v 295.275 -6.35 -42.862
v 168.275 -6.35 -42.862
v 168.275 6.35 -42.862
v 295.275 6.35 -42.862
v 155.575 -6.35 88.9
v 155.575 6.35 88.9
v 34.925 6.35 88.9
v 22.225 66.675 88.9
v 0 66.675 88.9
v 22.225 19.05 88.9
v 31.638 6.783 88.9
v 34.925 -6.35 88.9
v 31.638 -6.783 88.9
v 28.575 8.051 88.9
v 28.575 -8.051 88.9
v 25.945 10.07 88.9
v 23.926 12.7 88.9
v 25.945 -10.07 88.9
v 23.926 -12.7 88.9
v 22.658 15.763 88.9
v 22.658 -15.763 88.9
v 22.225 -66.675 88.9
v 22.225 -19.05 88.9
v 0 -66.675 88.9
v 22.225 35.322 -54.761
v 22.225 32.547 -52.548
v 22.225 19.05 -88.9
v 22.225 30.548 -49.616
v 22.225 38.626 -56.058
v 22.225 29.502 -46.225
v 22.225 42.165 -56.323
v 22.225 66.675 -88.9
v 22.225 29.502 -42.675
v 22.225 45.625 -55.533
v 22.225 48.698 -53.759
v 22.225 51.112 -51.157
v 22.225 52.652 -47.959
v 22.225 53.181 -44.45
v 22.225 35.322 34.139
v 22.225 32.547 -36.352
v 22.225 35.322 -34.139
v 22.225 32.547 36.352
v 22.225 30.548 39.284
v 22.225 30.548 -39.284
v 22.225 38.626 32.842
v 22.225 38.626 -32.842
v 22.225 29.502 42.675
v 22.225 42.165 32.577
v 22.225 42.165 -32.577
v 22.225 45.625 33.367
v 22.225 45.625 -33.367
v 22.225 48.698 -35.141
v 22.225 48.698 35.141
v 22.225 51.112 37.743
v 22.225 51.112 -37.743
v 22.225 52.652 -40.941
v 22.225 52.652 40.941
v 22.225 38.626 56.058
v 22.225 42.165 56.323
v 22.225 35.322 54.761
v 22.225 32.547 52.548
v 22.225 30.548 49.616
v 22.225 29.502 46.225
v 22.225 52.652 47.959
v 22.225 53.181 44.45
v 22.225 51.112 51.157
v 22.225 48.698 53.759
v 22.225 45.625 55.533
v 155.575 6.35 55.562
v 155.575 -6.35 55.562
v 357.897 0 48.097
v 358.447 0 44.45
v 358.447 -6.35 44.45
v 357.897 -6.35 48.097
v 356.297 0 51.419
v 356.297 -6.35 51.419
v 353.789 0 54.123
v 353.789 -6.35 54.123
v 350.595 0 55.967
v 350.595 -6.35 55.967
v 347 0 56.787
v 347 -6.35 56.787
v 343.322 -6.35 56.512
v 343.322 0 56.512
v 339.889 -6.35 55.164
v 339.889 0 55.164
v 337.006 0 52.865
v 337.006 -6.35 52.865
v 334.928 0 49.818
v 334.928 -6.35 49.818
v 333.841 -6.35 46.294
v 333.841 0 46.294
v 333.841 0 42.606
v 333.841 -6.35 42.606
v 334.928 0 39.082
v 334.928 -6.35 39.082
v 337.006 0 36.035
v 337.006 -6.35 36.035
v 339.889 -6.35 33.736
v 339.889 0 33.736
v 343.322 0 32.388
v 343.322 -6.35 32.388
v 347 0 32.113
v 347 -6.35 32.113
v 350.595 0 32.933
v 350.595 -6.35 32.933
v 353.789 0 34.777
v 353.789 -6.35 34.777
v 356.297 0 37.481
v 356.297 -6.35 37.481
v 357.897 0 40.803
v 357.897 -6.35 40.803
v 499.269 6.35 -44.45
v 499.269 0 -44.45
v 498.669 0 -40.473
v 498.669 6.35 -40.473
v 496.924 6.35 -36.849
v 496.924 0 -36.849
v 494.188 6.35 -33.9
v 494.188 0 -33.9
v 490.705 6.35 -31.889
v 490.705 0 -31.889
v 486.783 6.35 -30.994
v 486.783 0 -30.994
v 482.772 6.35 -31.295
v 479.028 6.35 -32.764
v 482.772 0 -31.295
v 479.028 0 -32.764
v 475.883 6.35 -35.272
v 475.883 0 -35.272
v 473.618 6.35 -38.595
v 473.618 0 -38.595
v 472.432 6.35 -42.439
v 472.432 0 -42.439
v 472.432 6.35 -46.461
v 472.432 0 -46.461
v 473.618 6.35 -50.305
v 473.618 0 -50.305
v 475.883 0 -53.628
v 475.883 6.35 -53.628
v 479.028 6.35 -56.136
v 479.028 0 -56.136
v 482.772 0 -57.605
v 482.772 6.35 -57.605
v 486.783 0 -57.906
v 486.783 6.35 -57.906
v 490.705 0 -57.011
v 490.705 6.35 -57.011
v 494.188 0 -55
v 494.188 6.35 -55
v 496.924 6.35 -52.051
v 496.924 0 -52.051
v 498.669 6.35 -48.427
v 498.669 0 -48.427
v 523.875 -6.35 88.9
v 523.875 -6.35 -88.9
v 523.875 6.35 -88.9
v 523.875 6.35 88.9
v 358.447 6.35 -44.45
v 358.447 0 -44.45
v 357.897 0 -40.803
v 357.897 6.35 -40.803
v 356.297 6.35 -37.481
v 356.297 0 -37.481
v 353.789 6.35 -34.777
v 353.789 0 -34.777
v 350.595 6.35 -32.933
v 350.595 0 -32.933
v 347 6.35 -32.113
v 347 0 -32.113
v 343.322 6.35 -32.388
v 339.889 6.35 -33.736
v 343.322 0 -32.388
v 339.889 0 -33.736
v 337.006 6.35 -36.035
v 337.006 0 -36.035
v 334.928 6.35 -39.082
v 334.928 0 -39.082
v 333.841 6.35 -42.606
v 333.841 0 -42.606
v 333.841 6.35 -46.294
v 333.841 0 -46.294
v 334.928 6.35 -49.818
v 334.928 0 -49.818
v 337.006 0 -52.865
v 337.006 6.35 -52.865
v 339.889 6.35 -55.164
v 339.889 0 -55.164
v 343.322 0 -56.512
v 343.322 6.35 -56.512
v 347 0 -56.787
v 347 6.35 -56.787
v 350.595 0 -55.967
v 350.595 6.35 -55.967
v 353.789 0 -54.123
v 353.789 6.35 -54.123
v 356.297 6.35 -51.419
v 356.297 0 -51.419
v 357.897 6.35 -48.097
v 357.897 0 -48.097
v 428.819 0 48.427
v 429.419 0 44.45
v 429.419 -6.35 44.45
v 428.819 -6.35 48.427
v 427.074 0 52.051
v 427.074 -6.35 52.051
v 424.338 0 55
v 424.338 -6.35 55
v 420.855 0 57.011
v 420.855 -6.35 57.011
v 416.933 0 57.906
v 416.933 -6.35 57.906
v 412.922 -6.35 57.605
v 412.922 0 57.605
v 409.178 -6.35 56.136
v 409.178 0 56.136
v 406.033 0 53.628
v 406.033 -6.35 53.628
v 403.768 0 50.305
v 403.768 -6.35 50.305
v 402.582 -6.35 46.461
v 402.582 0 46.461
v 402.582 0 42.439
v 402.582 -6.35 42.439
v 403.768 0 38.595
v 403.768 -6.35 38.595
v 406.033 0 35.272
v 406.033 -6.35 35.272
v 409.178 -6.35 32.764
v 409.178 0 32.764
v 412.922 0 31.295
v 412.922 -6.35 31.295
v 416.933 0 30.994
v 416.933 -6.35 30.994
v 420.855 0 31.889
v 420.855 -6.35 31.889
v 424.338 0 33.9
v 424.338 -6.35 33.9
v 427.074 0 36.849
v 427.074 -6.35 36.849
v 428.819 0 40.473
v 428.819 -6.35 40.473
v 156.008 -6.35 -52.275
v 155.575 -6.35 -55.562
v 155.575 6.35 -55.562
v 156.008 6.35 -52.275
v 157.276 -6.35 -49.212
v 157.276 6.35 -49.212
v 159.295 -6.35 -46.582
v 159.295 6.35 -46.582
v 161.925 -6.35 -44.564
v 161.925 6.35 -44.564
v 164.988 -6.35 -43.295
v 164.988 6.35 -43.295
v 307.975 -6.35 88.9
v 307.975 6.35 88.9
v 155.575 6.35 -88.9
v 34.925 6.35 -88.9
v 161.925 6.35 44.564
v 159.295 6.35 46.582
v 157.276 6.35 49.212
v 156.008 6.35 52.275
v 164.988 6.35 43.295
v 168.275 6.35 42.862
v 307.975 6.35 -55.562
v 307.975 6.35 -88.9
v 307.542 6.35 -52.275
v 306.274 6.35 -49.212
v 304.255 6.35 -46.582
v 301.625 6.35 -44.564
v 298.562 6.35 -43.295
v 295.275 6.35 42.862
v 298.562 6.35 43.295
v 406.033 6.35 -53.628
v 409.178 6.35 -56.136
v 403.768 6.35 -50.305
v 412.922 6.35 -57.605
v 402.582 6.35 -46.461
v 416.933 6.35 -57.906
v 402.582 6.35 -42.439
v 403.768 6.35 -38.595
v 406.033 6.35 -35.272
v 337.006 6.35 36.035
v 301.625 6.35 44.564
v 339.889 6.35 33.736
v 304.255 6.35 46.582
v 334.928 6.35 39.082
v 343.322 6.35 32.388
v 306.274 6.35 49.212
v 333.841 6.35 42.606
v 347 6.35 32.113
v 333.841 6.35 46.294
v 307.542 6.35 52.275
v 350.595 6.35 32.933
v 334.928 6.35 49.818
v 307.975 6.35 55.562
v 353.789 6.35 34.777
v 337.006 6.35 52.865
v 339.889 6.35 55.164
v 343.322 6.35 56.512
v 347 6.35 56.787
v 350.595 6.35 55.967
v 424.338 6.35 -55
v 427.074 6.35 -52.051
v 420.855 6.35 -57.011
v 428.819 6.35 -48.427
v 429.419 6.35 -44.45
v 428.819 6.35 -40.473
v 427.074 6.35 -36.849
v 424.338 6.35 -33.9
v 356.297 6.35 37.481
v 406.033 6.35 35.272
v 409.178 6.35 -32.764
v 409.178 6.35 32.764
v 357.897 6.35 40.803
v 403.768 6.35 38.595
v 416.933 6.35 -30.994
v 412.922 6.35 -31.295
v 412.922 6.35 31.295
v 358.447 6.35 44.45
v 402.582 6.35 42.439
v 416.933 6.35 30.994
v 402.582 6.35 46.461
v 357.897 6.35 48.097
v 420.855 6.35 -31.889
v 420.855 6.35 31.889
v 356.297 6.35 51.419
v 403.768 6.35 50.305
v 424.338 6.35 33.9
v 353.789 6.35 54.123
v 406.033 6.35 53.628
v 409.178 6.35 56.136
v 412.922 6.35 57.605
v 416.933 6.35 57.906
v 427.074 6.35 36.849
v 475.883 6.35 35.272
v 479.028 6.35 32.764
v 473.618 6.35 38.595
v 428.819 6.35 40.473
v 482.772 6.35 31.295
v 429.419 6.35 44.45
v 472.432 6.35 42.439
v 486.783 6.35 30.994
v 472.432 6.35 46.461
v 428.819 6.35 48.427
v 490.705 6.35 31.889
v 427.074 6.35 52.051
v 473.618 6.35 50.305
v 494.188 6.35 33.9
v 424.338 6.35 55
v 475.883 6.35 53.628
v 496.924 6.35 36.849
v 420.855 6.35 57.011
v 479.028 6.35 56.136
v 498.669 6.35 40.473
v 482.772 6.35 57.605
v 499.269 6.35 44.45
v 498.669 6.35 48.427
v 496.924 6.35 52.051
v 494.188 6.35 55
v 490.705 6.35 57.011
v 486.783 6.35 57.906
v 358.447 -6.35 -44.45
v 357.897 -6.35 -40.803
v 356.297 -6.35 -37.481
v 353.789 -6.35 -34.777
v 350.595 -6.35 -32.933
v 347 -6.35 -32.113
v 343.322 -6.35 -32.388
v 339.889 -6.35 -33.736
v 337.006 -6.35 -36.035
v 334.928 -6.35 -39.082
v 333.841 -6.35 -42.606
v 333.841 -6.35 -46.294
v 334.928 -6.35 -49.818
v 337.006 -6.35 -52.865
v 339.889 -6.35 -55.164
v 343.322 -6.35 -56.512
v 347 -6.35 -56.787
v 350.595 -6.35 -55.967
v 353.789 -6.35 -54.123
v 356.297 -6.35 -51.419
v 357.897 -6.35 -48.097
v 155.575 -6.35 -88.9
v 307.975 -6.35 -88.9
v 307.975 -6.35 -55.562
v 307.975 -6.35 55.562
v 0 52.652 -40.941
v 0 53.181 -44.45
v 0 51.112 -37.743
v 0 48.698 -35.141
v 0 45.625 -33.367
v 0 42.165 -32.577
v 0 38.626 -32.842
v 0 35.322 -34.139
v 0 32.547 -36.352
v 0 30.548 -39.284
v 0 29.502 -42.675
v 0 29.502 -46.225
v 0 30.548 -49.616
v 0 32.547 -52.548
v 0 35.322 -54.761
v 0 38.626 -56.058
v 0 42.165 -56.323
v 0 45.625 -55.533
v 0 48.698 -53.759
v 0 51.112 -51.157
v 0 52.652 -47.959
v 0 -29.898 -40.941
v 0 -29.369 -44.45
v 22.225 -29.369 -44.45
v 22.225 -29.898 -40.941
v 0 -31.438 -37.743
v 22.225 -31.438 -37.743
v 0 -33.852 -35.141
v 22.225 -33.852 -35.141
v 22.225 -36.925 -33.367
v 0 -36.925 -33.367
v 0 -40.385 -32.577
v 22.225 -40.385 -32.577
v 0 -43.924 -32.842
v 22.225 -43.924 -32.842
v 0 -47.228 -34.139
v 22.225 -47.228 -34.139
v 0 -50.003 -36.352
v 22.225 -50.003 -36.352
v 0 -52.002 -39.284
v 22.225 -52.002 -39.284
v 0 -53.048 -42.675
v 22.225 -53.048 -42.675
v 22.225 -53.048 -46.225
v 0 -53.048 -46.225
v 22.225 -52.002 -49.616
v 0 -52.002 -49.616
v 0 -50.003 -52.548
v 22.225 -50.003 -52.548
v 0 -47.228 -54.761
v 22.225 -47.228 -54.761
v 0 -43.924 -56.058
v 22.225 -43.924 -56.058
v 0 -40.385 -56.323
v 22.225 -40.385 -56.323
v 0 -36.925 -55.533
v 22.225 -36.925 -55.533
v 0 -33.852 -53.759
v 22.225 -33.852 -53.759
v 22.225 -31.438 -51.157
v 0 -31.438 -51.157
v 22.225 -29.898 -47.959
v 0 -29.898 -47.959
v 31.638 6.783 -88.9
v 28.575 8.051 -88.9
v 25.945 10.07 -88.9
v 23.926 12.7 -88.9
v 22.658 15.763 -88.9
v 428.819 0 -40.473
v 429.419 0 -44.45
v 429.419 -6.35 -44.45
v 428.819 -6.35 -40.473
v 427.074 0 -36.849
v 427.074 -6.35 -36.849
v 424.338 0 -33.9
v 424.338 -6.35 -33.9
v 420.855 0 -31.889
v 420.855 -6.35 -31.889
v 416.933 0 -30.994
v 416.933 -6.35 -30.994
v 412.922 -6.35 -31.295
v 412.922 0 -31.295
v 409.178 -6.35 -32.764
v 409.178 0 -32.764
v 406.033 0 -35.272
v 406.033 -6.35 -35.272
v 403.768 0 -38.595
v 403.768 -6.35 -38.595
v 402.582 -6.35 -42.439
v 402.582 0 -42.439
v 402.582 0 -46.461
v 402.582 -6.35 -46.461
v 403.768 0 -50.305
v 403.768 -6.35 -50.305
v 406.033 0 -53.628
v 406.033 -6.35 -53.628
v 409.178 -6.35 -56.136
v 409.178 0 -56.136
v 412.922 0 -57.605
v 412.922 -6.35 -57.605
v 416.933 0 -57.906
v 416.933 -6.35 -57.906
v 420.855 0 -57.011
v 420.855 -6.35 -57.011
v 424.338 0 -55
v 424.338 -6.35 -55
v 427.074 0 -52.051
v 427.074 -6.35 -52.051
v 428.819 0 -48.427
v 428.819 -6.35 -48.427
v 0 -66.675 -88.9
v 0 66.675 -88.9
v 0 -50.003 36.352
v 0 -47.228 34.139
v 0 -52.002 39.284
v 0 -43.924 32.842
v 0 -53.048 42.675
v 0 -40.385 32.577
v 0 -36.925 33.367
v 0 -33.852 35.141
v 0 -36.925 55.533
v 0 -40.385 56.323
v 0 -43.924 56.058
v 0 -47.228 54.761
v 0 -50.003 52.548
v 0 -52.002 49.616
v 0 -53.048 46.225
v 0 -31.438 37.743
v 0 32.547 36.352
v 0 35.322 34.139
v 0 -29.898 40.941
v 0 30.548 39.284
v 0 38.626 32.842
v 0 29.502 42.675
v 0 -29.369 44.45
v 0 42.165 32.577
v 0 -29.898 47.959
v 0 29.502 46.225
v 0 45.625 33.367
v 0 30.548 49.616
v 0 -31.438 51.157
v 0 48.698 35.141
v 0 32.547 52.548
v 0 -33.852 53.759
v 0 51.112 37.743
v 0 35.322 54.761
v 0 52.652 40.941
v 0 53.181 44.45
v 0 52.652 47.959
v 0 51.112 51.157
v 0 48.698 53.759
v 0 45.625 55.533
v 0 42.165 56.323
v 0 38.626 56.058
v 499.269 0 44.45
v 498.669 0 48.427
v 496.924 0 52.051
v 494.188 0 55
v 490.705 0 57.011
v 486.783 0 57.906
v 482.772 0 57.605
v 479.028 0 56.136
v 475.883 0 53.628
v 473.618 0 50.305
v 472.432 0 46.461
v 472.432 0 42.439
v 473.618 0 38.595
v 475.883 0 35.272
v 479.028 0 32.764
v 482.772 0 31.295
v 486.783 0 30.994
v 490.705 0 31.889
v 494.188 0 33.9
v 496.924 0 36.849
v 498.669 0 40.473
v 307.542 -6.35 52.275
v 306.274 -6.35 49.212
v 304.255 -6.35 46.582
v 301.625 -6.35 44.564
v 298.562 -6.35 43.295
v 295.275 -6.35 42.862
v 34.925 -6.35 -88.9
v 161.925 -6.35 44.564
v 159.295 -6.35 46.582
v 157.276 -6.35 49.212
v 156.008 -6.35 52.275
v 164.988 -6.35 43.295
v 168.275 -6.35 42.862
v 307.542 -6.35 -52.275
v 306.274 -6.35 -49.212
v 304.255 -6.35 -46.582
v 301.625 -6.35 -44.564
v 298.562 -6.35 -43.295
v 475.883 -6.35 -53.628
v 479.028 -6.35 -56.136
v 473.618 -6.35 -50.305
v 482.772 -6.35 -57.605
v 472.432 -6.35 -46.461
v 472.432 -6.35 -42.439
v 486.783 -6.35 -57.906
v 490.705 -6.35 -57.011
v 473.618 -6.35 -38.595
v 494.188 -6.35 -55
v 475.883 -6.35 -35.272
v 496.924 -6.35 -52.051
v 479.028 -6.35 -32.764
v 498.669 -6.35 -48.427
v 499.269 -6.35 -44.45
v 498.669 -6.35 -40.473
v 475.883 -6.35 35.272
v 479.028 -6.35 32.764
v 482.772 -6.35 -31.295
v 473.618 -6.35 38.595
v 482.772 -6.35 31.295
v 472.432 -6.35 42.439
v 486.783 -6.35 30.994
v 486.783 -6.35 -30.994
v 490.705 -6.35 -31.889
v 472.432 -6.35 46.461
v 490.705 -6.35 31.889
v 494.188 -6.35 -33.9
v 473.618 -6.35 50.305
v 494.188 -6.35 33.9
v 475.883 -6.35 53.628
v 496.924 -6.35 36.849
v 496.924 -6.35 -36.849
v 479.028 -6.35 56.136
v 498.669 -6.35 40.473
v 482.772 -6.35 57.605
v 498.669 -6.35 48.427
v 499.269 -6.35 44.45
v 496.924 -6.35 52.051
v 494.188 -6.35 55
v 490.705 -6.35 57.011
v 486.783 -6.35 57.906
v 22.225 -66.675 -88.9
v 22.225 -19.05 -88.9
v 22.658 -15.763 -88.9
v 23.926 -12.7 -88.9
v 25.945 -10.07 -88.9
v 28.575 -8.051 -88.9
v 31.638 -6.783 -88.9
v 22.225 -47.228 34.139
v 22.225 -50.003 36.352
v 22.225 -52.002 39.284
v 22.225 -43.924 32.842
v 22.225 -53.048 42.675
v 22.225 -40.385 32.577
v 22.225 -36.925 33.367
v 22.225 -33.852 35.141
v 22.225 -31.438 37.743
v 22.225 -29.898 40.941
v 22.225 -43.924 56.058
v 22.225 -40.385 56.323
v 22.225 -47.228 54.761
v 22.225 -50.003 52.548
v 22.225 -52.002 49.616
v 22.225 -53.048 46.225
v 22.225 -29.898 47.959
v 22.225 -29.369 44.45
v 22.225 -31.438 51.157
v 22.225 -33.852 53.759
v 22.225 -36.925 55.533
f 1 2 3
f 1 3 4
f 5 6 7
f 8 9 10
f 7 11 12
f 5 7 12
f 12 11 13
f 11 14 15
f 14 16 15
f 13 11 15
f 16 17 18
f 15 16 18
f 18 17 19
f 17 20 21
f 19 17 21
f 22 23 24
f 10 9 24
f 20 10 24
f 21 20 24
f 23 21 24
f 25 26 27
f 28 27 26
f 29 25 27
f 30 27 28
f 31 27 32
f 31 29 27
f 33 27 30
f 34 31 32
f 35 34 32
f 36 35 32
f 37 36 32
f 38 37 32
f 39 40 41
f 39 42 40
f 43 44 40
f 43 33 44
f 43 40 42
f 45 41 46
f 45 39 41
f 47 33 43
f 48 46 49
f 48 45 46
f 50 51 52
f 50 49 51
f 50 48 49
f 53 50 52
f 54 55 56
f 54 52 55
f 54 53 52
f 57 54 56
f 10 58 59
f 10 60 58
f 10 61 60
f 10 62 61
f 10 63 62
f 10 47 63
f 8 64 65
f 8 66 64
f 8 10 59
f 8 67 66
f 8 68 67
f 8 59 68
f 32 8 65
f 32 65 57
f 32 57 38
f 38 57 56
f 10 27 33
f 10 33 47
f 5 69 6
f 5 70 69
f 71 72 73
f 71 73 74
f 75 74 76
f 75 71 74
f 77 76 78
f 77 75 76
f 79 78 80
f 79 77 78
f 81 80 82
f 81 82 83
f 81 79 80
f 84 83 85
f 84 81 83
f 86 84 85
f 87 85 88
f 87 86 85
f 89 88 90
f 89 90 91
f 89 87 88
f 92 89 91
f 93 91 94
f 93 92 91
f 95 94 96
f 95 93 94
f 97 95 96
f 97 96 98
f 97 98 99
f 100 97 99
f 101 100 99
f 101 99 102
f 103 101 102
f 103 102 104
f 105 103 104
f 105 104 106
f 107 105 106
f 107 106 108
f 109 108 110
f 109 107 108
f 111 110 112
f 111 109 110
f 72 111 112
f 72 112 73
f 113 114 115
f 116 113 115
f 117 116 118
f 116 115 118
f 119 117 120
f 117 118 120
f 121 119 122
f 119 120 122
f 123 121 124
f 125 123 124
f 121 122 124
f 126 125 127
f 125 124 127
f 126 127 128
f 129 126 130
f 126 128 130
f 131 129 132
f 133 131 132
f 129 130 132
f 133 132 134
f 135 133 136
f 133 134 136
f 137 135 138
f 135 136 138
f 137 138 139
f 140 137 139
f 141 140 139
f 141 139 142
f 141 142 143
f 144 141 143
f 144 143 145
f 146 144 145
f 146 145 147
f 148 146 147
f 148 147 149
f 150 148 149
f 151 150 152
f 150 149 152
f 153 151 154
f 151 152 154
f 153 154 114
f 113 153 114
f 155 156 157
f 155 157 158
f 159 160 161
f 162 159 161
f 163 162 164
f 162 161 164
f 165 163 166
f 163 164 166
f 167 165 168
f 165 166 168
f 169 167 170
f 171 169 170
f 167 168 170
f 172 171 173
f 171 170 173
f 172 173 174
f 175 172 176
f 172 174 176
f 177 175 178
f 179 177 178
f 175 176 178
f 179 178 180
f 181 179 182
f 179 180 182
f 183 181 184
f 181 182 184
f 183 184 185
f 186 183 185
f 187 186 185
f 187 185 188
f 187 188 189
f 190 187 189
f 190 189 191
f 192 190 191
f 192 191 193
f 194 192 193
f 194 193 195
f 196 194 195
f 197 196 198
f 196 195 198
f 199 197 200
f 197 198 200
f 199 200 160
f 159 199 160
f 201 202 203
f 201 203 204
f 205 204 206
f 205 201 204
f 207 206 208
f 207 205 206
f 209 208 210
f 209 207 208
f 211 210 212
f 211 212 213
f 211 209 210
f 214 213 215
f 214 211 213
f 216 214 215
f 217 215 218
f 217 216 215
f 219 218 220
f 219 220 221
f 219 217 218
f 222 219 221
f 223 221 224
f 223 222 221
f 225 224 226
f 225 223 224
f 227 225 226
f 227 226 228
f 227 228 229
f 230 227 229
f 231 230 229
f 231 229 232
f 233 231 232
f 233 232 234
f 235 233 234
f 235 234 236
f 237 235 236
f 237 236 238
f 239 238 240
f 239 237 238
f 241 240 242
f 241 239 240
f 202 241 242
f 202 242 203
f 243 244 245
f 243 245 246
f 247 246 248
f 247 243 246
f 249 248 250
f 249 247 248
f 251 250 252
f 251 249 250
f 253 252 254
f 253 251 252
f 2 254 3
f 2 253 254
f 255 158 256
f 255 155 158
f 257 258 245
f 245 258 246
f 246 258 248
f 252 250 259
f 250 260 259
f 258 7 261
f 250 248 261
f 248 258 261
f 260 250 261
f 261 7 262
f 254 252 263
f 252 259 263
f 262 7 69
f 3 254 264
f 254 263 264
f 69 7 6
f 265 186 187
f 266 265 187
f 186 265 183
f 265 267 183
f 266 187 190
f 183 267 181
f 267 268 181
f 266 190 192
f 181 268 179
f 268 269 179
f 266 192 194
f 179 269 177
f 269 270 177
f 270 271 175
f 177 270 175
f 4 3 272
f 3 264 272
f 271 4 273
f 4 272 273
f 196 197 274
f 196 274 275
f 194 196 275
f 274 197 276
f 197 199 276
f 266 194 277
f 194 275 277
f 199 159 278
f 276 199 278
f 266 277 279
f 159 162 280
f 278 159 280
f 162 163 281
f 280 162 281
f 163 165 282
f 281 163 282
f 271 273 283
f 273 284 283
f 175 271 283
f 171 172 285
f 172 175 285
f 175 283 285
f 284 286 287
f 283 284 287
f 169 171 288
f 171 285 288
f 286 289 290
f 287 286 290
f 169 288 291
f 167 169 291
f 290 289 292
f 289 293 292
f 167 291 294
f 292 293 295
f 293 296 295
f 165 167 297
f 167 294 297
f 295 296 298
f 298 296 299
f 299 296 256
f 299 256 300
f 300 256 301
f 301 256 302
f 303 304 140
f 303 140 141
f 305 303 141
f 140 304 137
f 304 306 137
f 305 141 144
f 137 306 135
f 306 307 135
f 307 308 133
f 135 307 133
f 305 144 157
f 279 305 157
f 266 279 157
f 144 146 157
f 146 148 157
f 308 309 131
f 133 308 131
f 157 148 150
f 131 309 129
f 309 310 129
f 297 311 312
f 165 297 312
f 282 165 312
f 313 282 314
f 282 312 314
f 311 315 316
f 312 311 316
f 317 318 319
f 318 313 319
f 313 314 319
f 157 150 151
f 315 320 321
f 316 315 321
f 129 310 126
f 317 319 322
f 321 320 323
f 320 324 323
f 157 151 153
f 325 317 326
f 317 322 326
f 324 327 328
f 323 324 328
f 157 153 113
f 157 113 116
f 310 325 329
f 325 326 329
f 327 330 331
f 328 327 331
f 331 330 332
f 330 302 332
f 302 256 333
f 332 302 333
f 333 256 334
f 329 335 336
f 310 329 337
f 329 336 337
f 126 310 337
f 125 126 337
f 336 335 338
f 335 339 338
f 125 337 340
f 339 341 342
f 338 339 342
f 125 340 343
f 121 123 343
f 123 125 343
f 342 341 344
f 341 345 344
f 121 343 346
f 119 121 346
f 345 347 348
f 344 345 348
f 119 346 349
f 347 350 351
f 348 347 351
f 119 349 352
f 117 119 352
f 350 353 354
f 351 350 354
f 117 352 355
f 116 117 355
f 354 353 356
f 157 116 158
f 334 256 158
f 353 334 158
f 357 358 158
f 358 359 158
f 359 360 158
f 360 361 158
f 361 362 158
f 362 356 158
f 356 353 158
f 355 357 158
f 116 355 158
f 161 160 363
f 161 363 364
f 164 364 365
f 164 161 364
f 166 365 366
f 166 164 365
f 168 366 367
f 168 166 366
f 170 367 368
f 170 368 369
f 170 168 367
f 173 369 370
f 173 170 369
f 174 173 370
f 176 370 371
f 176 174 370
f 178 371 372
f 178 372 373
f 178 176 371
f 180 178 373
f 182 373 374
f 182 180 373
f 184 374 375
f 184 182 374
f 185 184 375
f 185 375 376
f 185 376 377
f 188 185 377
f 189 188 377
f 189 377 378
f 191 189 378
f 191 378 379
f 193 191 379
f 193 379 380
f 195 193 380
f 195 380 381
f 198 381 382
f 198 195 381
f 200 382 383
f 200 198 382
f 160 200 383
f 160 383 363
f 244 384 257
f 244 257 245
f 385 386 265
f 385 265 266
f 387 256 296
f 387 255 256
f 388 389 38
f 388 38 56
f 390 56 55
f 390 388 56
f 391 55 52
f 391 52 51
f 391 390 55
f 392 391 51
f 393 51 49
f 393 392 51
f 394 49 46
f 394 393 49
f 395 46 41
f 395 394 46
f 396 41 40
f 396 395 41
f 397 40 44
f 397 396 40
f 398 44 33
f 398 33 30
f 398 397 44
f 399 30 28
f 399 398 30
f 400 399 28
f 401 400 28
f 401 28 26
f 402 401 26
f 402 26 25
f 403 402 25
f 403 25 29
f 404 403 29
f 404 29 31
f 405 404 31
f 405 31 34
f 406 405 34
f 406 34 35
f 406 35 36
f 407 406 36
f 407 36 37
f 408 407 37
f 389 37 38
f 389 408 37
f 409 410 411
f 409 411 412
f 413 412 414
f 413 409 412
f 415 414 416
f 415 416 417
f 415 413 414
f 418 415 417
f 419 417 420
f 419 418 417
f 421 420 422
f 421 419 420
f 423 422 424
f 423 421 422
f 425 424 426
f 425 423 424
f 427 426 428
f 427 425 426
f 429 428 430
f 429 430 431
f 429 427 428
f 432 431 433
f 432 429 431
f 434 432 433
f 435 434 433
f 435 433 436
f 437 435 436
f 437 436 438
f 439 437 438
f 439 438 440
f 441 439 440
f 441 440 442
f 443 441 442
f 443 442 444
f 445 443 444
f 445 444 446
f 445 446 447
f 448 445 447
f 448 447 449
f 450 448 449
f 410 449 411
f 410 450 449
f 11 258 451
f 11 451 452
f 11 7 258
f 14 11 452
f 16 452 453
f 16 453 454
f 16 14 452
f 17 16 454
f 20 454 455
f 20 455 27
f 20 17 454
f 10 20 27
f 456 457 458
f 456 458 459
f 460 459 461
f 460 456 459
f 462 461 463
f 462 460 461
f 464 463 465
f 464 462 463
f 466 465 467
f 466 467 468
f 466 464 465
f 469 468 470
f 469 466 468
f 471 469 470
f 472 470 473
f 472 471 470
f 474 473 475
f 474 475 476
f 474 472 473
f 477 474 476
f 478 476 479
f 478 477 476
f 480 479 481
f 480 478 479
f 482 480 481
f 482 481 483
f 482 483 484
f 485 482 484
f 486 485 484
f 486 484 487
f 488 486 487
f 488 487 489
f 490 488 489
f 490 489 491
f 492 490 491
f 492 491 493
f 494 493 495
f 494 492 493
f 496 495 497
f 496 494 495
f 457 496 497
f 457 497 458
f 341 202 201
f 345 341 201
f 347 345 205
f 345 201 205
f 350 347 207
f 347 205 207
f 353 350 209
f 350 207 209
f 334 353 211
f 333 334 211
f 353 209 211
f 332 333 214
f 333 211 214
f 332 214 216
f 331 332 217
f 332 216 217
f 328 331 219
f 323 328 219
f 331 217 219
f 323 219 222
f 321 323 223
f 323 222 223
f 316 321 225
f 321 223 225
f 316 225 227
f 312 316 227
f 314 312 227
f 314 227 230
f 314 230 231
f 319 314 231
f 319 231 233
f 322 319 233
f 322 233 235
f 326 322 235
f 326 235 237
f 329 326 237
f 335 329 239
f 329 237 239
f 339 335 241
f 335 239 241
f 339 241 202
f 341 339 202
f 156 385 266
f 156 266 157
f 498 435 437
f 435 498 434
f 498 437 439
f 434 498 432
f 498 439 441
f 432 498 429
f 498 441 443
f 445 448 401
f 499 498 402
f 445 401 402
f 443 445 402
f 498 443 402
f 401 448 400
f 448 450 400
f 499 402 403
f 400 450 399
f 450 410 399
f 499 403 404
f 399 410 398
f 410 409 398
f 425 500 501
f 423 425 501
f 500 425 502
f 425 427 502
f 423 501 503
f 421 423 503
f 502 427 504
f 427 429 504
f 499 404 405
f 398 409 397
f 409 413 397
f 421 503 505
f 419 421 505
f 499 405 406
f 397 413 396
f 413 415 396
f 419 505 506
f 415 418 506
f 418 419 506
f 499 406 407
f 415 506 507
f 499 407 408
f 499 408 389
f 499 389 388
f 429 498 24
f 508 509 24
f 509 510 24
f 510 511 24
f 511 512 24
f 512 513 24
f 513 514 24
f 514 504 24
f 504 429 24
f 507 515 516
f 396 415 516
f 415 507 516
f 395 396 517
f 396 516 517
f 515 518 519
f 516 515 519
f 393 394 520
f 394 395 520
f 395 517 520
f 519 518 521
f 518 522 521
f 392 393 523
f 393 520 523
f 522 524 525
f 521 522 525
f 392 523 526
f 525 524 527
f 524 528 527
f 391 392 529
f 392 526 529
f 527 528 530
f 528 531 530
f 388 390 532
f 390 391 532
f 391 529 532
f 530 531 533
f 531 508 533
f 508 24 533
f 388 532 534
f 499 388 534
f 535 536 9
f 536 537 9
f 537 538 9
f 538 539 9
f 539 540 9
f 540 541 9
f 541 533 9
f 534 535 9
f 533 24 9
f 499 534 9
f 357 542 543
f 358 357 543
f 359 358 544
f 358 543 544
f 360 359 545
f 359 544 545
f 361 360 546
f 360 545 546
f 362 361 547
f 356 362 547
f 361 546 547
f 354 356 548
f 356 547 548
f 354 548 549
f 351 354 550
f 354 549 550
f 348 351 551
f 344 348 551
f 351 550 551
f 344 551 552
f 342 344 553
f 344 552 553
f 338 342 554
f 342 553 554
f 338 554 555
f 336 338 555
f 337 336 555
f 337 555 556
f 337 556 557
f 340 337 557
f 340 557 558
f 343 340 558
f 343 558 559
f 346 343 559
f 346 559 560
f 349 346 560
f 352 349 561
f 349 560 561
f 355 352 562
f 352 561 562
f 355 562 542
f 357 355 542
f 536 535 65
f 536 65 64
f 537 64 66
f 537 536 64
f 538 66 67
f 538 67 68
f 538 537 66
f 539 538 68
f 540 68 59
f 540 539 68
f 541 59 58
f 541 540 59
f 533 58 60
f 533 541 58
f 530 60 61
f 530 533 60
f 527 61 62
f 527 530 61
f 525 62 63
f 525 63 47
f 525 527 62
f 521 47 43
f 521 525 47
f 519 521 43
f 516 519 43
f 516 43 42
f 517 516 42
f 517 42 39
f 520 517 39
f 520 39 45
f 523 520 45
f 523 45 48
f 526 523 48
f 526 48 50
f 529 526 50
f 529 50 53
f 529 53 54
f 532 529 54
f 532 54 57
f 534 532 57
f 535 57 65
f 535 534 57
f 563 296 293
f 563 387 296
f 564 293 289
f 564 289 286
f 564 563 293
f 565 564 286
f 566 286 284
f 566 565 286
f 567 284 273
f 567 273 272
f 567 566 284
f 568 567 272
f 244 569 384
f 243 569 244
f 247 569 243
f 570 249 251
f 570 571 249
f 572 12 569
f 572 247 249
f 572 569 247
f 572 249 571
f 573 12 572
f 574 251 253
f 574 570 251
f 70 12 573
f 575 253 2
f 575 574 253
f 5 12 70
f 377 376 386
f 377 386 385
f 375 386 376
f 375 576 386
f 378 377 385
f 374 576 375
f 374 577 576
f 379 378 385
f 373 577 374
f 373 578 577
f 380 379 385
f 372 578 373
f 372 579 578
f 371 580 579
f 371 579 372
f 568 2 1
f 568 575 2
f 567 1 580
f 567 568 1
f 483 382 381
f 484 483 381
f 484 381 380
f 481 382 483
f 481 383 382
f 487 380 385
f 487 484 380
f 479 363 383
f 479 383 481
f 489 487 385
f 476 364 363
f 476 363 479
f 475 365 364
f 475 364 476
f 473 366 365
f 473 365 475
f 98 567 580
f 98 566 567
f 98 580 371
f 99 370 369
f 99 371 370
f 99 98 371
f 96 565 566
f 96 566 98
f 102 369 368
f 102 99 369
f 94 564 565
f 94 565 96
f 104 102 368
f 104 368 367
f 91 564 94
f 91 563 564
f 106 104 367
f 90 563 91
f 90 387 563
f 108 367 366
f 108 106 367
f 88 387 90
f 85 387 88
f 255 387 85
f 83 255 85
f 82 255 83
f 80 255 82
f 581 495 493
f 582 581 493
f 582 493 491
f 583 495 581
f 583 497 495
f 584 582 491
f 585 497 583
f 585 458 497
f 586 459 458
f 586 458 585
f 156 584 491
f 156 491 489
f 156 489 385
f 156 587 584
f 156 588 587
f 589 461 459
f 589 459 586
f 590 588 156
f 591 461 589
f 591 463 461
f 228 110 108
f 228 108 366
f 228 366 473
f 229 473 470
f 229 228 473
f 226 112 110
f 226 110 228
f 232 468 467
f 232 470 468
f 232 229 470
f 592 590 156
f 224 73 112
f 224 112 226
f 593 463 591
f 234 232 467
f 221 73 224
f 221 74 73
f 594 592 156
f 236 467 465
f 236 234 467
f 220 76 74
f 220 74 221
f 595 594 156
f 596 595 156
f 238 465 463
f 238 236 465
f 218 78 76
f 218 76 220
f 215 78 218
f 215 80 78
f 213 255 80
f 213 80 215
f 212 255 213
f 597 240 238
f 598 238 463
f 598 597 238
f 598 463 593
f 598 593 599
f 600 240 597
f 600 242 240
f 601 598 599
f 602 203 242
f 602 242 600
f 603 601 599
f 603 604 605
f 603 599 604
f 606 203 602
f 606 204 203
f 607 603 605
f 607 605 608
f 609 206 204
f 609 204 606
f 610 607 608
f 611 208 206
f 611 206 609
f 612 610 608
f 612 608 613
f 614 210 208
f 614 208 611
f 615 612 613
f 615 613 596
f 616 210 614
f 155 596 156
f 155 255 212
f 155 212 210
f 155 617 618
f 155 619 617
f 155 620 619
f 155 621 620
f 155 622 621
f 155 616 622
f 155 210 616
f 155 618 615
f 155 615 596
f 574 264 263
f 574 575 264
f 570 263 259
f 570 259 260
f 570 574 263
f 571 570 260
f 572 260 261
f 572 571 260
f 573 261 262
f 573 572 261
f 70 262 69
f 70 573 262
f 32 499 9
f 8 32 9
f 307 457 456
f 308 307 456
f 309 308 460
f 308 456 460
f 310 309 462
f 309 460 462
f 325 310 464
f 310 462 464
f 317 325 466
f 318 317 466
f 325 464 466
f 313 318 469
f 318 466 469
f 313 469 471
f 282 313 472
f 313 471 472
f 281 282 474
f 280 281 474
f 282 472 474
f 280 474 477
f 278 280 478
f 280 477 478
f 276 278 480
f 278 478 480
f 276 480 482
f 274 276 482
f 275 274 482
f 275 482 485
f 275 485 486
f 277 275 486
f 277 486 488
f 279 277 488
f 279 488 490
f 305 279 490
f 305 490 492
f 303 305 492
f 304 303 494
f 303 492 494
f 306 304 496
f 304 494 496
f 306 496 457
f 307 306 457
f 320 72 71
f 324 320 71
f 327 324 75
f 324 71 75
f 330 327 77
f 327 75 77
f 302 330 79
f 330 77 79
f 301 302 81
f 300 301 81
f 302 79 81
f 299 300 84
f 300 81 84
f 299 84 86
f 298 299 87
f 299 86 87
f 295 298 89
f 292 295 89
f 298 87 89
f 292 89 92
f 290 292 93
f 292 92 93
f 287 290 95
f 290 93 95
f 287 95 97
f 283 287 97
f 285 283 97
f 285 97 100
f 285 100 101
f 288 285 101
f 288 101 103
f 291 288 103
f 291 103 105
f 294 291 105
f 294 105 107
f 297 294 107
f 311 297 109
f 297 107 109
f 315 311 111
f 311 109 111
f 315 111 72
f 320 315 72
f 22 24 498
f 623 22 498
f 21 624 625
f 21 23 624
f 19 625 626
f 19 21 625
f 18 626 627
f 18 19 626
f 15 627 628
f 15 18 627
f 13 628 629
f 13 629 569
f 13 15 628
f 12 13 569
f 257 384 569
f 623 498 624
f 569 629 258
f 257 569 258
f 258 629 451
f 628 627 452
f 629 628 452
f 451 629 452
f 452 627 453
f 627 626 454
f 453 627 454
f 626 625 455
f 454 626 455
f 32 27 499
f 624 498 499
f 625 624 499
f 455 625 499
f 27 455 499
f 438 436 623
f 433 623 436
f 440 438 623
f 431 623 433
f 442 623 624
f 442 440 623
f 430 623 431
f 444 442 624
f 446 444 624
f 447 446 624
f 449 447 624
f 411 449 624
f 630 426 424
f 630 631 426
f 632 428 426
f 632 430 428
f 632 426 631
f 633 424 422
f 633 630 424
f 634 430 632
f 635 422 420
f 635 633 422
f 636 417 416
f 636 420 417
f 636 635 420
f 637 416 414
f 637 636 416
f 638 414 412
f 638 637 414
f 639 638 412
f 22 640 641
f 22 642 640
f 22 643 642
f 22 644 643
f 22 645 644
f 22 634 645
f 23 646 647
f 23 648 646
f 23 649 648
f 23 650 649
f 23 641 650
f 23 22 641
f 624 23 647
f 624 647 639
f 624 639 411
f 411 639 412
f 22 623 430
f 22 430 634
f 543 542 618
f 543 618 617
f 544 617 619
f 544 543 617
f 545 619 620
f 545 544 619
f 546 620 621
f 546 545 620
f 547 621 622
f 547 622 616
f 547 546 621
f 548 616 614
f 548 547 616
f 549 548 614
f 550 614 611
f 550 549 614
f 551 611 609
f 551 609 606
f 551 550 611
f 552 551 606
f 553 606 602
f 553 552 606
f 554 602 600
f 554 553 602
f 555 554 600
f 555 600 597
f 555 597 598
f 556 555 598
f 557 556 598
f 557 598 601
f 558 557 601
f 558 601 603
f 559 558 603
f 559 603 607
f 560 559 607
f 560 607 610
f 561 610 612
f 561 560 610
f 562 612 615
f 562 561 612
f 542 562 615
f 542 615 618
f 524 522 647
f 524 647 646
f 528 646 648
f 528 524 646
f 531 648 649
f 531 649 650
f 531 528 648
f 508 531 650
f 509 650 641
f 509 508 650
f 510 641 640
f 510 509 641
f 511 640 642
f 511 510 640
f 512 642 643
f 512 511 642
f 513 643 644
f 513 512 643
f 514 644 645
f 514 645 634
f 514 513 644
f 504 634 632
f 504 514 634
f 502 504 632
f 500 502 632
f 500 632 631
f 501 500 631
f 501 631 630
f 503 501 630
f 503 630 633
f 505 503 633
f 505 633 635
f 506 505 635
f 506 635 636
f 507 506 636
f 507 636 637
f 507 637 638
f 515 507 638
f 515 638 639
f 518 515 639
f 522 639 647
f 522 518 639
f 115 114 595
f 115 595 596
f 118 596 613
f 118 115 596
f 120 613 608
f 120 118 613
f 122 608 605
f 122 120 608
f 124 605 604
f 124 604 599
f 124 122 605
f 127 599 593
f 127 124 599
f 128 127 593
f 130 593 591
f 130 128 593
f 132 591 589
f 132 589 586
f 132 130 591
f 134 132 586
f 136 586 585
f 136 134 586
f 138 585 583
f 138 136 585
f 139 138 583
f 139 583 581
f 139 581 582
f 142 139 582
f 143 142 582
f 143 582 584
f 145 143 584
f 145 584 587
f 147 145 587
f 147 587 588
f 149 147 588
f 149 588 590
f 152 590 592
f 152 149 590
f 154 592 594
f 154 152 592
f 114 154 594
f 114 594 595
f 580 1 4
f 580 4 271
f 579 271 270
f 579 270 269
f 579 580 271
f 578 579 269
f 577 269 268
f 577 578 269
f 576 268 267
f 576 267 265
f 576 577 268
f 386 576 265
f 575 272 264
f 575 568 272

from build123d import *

# Parameters (mm, degrees)
F0_R     = 12.372008059
F0_R_2   = 13.49375
F1_DEPTH = 6.35
F2_DEPTH = 6.35
F3_R     = 11.90625
F4_DEPTH = 22.225
F5_R     = 12.7


with BuildPart() as f1:
    # F0 (on Front) → F1 (new body)
    with BuildSketch(Plane.XZ):
        with BuildLine():
            Line((0, 88.9), (0, 0))
            Line((0, 0), (0, -88.9))
            Line((0, -88.9), (155.575, -88.9))
            Line((155.575, -88.9), (155.575, -55.5625))
            ThreePointArc((155.575, -55.5625), (159.2947438789, -46.5822438789), (168.275, -42.8625))
            Line((168.275, -42.8625), (295.275, -42.8625))
            ThreePointArc((295.275, -42.8625), (304.2552561211, -46.5822438789), (307.975, -55.5625))
            Line((307.975, -55.5625), (307.975, -88.9))
            Line((307.975, -88.9), (523.875, -88.9))
            Line((523.875, -88.9), (523.875, 0))
            Line((523.875, 0), (523.875, 88.9))
            Line((523.875, 88.9), (307.975, 88.9))
            Line((307.975, 88.9), (307.975, 55.5625))
            ThreePointArc((307.975, 55.5625), (304.2552561211, 46.5822438789), (295.275, 42.8625))
            Line((295.275, 42.8625), (168.275, 42.8625))
            ThreePointArc((168.275, 42.8625), (159.2947438789, 46.5822438789), (155.575, 55.5625))
            Line((155.575, 55.5625), (155.575, 88.9))
            Line((155.575, 88.9), (0, 88.9))
        make_face()
        with Locations((346.075, -44.45)):
            Circle(F0_R, mode=Mode.SUBTRACT)
        with Locations((415.925, -44.45)):
            Circle(F0_R_2, mode=Mode.SUBTRACT)
        with Locations((485.775, -44.45)):
            Circle(F0_R_2, mode=Mode.SUBTRACT)
        with Locations((346.075, 44.45)):
            Circle(F0_R, mode=Mode.SUBTRACT)
        with Locations((415.925, 44.45)):
            Circle(F0_R_2, mode=Mode.SUBTRACT)
        with Locations((485.775, 44.45)):
            Circle(F0_R_2, mode=Mode.SUBTRACT)
    extrude(amount=F1_DEPTH)

    # F2 (add): a face of the model
    f2_faces = [f1.faces().sort_by_distance(p)[0] for p in [
        (260.6993813627, 0, 0),
    ]]
    extrude(f2_faces, amount=F2_DEPTH)

    # F3 (on Right) → F4 (join)
    with BuildSketch(Plane.YZ):
        Polygon((66.675, 88.9), (0, 88.9), (-66.675, 88.9), (-66.675, 0), (-66.675, -88.9), (0, -88.9), (66.675, -88.9), (66.675, 0), align=None)
        with Locations((-41.275, -44.45)):
            Circle(F3_R, mode=Mode.SUBTRACT)
        with Locations((41.275, -44.45)):
            Circle(F3_R, mode=Mode.SUBTRACT)
        with Locations((-41.275, 44.45)):
            Circle(F3_R, mode=Mode.SUBTRACT)
        with Locations((41.275, 44.45)):
            Circle(F3_R, mode=Mode.SUBTRACT)
    extrude(amount=F4_DEPTH)

    # F5
    f5_edges = [f1.edges().sort_by_distance(p)[0] for p in [
        (22.225, 6.35, 0),
        (22.225, -6.35, 0),
    ]]
    fillet(f5_edges, radius=F5_R)


solid = f1.part
